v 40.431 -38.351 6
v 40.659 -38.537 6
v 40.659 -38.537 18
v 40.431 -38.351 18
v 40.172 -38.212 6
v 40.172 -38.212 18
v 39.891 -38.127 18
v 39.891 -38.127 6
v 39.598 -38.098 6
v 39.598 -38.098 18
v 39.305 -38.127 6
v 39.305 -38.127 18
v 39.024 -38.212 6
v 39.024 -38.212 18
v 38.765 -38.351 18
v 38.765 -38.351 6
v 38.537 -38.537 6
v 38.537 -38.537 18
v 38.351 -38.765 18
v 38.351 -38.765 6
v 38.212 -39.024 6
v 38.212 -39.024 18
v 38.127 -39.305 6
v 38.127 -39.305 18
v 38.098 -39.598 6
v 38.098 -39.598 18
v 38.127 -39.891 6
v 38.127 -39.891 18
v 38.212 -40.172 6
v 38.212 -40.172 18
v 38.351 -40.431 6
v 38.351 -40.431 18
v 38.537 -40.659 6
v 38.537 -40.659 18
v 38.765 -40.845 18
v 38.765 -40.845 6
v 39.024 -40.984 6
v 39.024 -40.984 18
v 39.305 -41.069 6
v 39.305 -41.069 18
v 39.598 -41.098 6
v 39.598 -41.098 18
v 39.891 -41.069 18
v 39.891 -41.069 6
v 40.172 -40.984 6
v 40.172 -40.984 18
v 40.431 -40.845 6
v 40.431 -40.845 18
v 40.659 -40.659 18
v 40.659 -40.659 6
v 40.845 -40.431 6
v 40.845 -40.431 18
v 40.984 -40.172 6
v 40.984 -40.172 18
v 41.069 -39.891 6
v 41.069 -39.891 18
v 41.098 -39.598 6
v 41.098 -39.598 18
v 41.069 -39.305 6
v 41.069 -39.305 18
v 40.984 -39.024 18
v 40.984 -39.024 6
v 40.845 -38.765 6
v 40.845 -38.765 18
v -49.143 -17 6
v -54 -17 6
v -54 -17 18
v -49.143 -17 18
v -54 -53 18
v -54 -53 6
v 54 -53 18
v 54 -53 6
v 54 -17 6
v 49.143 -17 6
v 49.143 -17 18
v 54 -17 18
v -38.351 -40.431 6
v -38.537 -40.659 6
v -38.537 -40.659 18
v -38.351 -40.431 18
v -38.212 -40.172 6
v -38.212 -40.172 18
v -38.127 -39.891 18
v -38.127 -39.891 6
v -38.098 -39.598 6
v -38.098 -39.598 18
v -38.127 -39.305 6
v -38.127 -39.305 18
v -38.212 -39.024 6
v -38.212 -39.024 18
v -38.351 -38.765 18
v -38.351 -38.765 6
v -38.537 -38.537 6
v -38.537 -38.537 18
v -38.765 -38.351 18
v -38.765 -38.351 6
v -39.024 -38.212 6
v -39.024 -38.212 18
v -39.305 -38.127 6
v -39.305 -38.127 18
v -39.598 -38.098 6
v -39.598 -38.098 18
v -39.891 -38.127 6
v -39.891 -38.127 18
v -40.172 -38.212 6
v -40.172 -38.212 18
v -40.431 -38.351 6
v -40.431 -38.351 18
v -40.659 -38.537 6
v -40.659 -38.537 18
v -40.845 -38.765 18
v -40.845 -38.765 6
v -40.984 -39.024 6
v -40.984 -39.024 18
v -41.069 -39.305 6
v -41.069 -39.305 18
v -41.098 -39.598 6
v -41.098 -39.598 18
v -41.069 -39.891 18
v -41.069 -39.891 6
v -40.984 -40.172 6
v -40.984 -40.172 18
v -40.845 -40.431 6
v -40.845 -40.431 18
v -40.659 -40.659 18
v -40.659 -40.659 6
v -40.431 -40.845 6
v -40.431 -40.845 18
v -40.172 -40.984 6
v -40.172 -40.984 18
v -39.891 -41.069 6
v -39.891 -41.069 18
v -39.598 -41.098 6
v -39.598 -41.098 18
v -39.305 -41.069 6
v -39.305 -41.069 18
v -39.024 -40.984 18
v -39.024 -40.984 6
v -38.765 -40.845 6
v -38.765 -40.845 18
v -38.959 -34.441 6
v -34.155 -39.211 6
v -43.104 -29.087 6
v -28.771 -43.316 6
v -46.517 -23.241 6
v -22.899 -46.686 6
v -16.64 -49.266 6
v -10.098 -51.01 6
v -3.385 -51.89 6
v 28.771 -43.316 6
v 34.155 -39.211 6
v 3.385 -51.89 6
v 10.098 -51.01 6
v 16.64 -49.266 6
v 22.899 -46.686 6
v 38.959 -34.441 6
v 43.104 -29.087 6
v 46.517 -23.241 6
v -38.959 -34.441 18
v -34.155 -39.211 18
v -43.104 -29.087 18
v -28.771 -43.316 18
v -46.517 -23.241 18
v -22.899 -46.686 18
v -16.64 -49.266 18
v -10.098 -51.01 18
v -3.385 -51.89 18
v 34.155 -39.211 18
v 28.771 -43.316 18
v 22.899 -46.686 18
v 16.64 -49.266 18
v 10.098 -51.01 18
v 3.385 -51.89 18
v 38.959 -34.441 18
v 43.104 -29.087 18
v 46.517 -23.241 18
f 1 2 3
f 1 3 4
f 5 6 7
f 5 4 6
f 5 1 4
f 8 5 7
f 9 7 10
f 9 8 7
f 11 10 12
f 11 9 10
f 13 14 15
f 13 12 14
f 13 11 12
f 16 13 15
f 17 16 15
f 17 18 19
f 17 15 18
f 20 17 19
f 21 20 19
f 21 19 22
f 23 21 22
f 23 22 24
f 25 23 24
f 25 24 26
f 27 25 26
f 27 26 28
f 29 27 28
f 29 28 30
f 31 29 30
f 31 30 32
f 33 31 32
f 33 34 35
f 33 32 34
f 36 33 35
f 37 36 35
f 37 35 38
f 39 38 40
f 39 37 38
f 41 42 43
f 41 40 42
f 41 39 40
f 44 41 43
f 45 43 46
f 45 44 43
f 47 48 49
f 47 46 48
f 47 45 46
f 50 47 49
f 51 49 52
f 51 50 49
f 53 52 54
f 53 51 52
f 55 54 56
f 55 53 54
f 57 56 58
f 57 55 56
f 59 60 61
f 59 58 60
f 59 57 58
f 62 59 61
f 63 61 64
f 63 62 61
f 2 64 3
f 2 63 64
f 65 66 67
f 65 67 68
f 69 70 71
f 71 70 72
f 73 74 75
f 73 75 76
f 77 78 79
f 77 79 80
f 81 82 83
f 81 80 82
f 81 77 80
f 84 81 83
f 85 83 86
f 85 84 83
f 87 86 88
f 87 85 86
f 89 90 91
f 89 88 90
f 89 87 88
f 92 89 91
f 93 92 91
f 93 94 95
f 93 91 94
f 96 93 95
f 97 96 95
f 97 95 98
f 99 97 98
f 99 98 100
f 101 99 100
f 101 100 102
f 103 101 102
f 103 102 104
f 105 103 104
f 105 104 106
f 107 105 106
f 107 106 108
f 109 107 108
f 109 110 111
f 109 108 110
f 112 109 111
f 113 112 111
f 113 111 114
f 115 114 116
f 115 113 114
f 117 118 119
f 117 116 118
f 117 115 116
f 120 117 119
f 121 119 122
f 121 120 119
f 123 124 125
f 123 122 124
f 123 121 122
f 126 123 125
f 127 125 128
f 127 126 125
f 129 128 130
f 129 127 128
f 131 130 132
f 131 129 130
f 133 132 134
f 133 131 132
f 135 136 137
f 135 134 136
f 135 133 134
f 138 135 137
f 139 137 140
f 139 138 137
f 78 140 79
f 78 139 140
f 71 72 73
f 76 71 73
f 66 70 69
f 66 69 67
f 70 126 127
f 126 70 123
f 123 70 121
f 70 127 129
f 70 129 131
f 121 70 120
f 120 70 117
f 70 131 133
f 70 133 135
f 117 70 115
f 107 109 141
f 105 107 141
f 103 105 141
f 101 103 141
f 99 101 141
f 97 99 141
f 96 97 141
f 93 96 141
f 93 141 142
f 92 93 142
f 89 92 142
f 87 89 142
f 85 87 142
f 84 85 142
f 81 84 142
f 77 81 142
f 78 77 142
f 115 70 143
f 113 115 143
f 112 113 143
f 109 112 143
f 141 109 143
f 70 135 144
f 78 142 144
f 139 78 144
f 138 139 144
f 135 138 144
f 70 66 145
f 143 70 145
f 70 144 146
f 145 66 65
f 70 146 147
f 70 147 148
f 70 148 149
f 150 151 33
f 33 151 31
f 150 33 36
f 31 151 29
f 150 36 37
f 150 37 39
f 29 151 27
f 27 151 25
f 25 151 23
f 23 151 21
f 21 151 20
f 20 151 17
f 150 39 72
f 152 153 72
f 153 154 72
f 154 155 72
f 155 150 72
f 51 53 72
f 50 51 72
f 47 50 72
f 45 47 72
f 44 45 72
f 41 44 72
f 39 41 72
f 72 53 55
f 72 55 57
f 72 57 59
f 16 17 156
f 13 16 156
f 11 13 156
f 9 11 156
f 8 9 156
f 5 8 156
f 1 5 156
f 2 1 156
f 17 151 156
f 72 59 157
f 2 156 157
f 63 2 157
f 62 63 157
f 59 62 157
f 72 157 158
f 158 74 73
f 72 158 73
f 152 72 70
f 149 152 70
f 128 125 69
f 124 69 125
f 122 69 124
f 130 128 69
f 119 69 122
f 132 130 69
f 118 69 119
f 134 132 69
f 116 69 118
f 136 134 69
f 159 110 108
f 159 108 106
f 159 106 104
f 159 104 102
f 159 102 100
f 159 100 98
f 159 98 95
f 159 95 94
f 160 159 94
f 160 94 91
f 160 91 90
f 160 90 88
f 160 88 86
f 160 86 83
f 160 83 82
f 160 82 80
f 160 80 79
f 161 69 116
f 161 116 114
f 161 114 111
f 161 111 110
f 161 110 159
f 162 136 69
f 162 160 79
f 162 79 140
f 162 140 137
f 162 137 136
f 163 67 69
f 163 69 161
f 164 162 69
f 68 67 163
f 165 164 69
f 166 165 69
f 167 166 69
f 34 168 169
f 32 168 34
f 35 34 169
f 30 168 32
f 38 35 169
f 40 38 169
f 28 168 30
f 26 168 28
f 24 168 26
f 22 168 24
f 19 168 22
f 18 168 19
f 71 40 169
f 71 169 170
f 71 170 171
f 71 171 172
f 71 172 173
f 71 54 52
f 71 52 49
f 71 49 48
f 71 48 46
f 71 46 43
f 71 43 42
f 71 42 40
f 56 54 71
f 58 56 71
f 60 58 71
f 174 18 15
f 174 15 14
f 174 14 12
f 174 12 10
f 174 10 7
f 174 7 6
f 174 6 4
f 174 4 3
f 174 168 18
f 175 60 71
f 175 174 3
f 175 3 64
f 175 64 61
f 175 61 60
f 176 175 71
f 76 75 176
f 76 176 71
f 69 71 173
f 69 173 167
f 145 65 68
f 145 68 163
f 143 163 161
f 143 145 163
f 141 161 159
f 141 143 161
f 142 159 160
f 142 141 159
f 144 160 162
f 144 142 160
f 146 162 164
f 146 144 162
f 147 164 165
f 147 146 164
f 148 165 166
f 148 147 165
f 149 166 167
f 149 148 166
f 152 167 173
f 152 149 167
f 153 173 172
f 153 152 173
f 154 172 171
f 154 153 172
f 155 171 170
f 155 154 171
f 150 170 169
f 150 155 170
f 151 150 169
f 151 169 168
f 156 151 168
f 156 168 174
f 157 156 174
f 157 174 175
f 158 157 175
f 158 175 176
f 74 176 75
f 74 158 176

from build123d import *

# Parameters (mm, degrees)
CYLINDER1525_R               = 1.5
CYLINDER1525_DEPTH           = 50
CYLINDER1525_PLACEMENT_ANGLE = 45
CYLINDER1508_R               = 1.5
CYLINDER1508_DEPTH           = 50
CYLINDER1508_PLACEMENT_ANGLE = 135
CYLINDER1511_R               = 1.5
CYLINDER1511_DEPTH           = 50
CYLINDER1521_R               = 1.5
CYLINDER1521_DEPTH           = 50
CYLINDER1521_PLACEMENT_ANGLE = 225
CYLINDER1514_R               = 1.5
CYLINDER1514_DEPTH           = 50
CYLINDER1505_R               = 1.5
CYLINDER1505_DEPTH           = 50
CYLINDER1505_PLACEMENT_ANGLE = 45
CYLINDER1519_R               = 1.5
CYLINDER1519_DEPTH           = 50
CYLINDER1516_R               = 52
CYLINDER1516_DEPTH           = 16
BOX524_W                     = 108
BOX524_H                     = 36
BOX524_DEPTH                 = 12


with BuildPart() as v_lec1525:
    # Cylinder1525 → Cylinder1525 (new body)
    with BuildSketch(Plane.XY):
        Circle(CYLINDER1525_R)
    extrude(amount=CYLINDER1525_DEPTH)


with BuildPart() as v_lec1525_1:
    # Cylinder1525 placement: moved
    add(v_lec1525.part.moved(Location((39.59798, -39.59798, 2))).rotate(Axis((39.59798, -39.59798, 2), (0, 0, 1)), CYLINDER1525_PLACEMENT_ANGLE))


with BuildPart() as v_lec1508:
    # Cylinder1508 → Cylinder1508 (new body)
    with BuildSketch(Plane.XY):
        Circle(CYLINDER1508_R)
    extrude(amount=CYLINDER1508_DEPTH)


with BuildPart() as v_lec1508_1:
    # Cylinder1508 placement: moved
    add(v_lec1508.part.moved(Location((39.59798, 39.59798, 2))).rotate(Axis((39.59798, 39.59798, 2), (0, 0, 1)), CYLINDER1508_PLACEMENT_ANGLE))


with BuildPart() as v_lec1511:
    # Cylinder1511 → Cylinder1511 (new body)
    with BuildSketch(Plane(origin=(0, 56, 2), x_dir=(-1, 0, 0), z_dir=(0, 0, 1))):
        Circle(CYLINDER1511_R)
    extrude(amount=CYLINDER1511_DEPTH)


with BuildPart() as v_lec1521:
    # Cylinder1521 → Cylinder1521 (new body)
    with BuildSketch(Plane.XY):
        Circle(CYLINDER1521_R)
    extrude(amount=CYLINDER1521_DEPTH)


with BuildPart() as v_lec1521_1:
    # Cylinder1521 placement: moved
    add(v_lec1521.part.moved(Location((-39.59798, 39.59798, 2))).rotate(Axis((-39.59798, 39.59798, 2), (0, 0, 1)), CYLINDER1521_PLACEMENT_ANGLE))


with BuildPart() as v_lec1514:
    # Cylinder1514 → Cylinder1514 (new body)
    with BuildSketch(Plane(origin=(-56, 0, 2), x_dir=(0, -1, 0), z_dir=(0, 0, 1))):
        Circle(CYLINDER1514_R)
    extrude(amount=CYLINDER1514_DEPTH)


with BuildPart() as v_lec1505:
    # Cylinder1505 → Cylinder1505 (new body)
    with BuildSketch(Plane.XY):
        Circle(CYLINDER1505_R)
    extrude(amount=CYLINDER1505_DEPTH)


with BuildPart() as v_lec1505_1:
    # Cylinder1505 placement: moved
    add(v_lec1505.part.moved(Location((-39.59798, -39.59798, 2))).rotate(Axis((-39.59798, -39.59798, 2), (0, 0, -1)), CYLINDER1505_PLACEMENT_ANGLE))


with BuildPart() as compound908:
    # Cylinder1519 → Cylinder1519 (new body)
    with BuildSketch(Plane(origin=(0, -56, 2), x_dir=(1, 0, 0), z_dir=(0, 0, 1))):
        Circle(CYLINDER1519_R)
    extrude(amount=CYLINDER1519_DEPTH)

    # Compound908: union Válec1525, Válec1508, Válec1511, Válec1521, Válec1514, Válec1505
    add(v_lec1525_1.part)
    add(v_lec1508_1.part)
    add(v_lec1511.part)
    add(v_lec1521_1.part)
    add(v_lec1514.part)
    add(v_lec1505_1.part)


with BuildPart() as v_lec1516:
    # Cylinder1516 → Cylinder1516 (new body)
    with BuildSketch(Plane.XY.offset(20)):
        Circle(CYLINDER1516_R)
    extrude(amount=CYLINDER1516_DEPTH)


with BuildPart() as cut559:
    # Box524 → Box524 (new body)
    with BuildSketch(Plane(origin=(-54, -53, 20), x_dir=(1, 0, 0), z_dir=(0, 0, 1))):
        with Locations((54, 18)):
            Rectangle(BOX524_W, BOX524_H)
    extrude(amount=BOX524_DEPTH)

    # Cut550: cut Válec1516
    add(v_lec1516.part, mode=Mode.SUBTRACT)


with BuildPart() as cut559_1:
    # Cut550 placement: moved
    add(cut559.part.moved(Location((0, 0, -10))))

    # Cut559: cut Compound908
    add(compound908.part, mode=Mode.SUBTRACT)


with BuildPart() as cut559_2:
    # Cut559 placement: moved
    add(cut559_1.part.moved(Location((0, 0, -4))))


solid = cut559_2.part
